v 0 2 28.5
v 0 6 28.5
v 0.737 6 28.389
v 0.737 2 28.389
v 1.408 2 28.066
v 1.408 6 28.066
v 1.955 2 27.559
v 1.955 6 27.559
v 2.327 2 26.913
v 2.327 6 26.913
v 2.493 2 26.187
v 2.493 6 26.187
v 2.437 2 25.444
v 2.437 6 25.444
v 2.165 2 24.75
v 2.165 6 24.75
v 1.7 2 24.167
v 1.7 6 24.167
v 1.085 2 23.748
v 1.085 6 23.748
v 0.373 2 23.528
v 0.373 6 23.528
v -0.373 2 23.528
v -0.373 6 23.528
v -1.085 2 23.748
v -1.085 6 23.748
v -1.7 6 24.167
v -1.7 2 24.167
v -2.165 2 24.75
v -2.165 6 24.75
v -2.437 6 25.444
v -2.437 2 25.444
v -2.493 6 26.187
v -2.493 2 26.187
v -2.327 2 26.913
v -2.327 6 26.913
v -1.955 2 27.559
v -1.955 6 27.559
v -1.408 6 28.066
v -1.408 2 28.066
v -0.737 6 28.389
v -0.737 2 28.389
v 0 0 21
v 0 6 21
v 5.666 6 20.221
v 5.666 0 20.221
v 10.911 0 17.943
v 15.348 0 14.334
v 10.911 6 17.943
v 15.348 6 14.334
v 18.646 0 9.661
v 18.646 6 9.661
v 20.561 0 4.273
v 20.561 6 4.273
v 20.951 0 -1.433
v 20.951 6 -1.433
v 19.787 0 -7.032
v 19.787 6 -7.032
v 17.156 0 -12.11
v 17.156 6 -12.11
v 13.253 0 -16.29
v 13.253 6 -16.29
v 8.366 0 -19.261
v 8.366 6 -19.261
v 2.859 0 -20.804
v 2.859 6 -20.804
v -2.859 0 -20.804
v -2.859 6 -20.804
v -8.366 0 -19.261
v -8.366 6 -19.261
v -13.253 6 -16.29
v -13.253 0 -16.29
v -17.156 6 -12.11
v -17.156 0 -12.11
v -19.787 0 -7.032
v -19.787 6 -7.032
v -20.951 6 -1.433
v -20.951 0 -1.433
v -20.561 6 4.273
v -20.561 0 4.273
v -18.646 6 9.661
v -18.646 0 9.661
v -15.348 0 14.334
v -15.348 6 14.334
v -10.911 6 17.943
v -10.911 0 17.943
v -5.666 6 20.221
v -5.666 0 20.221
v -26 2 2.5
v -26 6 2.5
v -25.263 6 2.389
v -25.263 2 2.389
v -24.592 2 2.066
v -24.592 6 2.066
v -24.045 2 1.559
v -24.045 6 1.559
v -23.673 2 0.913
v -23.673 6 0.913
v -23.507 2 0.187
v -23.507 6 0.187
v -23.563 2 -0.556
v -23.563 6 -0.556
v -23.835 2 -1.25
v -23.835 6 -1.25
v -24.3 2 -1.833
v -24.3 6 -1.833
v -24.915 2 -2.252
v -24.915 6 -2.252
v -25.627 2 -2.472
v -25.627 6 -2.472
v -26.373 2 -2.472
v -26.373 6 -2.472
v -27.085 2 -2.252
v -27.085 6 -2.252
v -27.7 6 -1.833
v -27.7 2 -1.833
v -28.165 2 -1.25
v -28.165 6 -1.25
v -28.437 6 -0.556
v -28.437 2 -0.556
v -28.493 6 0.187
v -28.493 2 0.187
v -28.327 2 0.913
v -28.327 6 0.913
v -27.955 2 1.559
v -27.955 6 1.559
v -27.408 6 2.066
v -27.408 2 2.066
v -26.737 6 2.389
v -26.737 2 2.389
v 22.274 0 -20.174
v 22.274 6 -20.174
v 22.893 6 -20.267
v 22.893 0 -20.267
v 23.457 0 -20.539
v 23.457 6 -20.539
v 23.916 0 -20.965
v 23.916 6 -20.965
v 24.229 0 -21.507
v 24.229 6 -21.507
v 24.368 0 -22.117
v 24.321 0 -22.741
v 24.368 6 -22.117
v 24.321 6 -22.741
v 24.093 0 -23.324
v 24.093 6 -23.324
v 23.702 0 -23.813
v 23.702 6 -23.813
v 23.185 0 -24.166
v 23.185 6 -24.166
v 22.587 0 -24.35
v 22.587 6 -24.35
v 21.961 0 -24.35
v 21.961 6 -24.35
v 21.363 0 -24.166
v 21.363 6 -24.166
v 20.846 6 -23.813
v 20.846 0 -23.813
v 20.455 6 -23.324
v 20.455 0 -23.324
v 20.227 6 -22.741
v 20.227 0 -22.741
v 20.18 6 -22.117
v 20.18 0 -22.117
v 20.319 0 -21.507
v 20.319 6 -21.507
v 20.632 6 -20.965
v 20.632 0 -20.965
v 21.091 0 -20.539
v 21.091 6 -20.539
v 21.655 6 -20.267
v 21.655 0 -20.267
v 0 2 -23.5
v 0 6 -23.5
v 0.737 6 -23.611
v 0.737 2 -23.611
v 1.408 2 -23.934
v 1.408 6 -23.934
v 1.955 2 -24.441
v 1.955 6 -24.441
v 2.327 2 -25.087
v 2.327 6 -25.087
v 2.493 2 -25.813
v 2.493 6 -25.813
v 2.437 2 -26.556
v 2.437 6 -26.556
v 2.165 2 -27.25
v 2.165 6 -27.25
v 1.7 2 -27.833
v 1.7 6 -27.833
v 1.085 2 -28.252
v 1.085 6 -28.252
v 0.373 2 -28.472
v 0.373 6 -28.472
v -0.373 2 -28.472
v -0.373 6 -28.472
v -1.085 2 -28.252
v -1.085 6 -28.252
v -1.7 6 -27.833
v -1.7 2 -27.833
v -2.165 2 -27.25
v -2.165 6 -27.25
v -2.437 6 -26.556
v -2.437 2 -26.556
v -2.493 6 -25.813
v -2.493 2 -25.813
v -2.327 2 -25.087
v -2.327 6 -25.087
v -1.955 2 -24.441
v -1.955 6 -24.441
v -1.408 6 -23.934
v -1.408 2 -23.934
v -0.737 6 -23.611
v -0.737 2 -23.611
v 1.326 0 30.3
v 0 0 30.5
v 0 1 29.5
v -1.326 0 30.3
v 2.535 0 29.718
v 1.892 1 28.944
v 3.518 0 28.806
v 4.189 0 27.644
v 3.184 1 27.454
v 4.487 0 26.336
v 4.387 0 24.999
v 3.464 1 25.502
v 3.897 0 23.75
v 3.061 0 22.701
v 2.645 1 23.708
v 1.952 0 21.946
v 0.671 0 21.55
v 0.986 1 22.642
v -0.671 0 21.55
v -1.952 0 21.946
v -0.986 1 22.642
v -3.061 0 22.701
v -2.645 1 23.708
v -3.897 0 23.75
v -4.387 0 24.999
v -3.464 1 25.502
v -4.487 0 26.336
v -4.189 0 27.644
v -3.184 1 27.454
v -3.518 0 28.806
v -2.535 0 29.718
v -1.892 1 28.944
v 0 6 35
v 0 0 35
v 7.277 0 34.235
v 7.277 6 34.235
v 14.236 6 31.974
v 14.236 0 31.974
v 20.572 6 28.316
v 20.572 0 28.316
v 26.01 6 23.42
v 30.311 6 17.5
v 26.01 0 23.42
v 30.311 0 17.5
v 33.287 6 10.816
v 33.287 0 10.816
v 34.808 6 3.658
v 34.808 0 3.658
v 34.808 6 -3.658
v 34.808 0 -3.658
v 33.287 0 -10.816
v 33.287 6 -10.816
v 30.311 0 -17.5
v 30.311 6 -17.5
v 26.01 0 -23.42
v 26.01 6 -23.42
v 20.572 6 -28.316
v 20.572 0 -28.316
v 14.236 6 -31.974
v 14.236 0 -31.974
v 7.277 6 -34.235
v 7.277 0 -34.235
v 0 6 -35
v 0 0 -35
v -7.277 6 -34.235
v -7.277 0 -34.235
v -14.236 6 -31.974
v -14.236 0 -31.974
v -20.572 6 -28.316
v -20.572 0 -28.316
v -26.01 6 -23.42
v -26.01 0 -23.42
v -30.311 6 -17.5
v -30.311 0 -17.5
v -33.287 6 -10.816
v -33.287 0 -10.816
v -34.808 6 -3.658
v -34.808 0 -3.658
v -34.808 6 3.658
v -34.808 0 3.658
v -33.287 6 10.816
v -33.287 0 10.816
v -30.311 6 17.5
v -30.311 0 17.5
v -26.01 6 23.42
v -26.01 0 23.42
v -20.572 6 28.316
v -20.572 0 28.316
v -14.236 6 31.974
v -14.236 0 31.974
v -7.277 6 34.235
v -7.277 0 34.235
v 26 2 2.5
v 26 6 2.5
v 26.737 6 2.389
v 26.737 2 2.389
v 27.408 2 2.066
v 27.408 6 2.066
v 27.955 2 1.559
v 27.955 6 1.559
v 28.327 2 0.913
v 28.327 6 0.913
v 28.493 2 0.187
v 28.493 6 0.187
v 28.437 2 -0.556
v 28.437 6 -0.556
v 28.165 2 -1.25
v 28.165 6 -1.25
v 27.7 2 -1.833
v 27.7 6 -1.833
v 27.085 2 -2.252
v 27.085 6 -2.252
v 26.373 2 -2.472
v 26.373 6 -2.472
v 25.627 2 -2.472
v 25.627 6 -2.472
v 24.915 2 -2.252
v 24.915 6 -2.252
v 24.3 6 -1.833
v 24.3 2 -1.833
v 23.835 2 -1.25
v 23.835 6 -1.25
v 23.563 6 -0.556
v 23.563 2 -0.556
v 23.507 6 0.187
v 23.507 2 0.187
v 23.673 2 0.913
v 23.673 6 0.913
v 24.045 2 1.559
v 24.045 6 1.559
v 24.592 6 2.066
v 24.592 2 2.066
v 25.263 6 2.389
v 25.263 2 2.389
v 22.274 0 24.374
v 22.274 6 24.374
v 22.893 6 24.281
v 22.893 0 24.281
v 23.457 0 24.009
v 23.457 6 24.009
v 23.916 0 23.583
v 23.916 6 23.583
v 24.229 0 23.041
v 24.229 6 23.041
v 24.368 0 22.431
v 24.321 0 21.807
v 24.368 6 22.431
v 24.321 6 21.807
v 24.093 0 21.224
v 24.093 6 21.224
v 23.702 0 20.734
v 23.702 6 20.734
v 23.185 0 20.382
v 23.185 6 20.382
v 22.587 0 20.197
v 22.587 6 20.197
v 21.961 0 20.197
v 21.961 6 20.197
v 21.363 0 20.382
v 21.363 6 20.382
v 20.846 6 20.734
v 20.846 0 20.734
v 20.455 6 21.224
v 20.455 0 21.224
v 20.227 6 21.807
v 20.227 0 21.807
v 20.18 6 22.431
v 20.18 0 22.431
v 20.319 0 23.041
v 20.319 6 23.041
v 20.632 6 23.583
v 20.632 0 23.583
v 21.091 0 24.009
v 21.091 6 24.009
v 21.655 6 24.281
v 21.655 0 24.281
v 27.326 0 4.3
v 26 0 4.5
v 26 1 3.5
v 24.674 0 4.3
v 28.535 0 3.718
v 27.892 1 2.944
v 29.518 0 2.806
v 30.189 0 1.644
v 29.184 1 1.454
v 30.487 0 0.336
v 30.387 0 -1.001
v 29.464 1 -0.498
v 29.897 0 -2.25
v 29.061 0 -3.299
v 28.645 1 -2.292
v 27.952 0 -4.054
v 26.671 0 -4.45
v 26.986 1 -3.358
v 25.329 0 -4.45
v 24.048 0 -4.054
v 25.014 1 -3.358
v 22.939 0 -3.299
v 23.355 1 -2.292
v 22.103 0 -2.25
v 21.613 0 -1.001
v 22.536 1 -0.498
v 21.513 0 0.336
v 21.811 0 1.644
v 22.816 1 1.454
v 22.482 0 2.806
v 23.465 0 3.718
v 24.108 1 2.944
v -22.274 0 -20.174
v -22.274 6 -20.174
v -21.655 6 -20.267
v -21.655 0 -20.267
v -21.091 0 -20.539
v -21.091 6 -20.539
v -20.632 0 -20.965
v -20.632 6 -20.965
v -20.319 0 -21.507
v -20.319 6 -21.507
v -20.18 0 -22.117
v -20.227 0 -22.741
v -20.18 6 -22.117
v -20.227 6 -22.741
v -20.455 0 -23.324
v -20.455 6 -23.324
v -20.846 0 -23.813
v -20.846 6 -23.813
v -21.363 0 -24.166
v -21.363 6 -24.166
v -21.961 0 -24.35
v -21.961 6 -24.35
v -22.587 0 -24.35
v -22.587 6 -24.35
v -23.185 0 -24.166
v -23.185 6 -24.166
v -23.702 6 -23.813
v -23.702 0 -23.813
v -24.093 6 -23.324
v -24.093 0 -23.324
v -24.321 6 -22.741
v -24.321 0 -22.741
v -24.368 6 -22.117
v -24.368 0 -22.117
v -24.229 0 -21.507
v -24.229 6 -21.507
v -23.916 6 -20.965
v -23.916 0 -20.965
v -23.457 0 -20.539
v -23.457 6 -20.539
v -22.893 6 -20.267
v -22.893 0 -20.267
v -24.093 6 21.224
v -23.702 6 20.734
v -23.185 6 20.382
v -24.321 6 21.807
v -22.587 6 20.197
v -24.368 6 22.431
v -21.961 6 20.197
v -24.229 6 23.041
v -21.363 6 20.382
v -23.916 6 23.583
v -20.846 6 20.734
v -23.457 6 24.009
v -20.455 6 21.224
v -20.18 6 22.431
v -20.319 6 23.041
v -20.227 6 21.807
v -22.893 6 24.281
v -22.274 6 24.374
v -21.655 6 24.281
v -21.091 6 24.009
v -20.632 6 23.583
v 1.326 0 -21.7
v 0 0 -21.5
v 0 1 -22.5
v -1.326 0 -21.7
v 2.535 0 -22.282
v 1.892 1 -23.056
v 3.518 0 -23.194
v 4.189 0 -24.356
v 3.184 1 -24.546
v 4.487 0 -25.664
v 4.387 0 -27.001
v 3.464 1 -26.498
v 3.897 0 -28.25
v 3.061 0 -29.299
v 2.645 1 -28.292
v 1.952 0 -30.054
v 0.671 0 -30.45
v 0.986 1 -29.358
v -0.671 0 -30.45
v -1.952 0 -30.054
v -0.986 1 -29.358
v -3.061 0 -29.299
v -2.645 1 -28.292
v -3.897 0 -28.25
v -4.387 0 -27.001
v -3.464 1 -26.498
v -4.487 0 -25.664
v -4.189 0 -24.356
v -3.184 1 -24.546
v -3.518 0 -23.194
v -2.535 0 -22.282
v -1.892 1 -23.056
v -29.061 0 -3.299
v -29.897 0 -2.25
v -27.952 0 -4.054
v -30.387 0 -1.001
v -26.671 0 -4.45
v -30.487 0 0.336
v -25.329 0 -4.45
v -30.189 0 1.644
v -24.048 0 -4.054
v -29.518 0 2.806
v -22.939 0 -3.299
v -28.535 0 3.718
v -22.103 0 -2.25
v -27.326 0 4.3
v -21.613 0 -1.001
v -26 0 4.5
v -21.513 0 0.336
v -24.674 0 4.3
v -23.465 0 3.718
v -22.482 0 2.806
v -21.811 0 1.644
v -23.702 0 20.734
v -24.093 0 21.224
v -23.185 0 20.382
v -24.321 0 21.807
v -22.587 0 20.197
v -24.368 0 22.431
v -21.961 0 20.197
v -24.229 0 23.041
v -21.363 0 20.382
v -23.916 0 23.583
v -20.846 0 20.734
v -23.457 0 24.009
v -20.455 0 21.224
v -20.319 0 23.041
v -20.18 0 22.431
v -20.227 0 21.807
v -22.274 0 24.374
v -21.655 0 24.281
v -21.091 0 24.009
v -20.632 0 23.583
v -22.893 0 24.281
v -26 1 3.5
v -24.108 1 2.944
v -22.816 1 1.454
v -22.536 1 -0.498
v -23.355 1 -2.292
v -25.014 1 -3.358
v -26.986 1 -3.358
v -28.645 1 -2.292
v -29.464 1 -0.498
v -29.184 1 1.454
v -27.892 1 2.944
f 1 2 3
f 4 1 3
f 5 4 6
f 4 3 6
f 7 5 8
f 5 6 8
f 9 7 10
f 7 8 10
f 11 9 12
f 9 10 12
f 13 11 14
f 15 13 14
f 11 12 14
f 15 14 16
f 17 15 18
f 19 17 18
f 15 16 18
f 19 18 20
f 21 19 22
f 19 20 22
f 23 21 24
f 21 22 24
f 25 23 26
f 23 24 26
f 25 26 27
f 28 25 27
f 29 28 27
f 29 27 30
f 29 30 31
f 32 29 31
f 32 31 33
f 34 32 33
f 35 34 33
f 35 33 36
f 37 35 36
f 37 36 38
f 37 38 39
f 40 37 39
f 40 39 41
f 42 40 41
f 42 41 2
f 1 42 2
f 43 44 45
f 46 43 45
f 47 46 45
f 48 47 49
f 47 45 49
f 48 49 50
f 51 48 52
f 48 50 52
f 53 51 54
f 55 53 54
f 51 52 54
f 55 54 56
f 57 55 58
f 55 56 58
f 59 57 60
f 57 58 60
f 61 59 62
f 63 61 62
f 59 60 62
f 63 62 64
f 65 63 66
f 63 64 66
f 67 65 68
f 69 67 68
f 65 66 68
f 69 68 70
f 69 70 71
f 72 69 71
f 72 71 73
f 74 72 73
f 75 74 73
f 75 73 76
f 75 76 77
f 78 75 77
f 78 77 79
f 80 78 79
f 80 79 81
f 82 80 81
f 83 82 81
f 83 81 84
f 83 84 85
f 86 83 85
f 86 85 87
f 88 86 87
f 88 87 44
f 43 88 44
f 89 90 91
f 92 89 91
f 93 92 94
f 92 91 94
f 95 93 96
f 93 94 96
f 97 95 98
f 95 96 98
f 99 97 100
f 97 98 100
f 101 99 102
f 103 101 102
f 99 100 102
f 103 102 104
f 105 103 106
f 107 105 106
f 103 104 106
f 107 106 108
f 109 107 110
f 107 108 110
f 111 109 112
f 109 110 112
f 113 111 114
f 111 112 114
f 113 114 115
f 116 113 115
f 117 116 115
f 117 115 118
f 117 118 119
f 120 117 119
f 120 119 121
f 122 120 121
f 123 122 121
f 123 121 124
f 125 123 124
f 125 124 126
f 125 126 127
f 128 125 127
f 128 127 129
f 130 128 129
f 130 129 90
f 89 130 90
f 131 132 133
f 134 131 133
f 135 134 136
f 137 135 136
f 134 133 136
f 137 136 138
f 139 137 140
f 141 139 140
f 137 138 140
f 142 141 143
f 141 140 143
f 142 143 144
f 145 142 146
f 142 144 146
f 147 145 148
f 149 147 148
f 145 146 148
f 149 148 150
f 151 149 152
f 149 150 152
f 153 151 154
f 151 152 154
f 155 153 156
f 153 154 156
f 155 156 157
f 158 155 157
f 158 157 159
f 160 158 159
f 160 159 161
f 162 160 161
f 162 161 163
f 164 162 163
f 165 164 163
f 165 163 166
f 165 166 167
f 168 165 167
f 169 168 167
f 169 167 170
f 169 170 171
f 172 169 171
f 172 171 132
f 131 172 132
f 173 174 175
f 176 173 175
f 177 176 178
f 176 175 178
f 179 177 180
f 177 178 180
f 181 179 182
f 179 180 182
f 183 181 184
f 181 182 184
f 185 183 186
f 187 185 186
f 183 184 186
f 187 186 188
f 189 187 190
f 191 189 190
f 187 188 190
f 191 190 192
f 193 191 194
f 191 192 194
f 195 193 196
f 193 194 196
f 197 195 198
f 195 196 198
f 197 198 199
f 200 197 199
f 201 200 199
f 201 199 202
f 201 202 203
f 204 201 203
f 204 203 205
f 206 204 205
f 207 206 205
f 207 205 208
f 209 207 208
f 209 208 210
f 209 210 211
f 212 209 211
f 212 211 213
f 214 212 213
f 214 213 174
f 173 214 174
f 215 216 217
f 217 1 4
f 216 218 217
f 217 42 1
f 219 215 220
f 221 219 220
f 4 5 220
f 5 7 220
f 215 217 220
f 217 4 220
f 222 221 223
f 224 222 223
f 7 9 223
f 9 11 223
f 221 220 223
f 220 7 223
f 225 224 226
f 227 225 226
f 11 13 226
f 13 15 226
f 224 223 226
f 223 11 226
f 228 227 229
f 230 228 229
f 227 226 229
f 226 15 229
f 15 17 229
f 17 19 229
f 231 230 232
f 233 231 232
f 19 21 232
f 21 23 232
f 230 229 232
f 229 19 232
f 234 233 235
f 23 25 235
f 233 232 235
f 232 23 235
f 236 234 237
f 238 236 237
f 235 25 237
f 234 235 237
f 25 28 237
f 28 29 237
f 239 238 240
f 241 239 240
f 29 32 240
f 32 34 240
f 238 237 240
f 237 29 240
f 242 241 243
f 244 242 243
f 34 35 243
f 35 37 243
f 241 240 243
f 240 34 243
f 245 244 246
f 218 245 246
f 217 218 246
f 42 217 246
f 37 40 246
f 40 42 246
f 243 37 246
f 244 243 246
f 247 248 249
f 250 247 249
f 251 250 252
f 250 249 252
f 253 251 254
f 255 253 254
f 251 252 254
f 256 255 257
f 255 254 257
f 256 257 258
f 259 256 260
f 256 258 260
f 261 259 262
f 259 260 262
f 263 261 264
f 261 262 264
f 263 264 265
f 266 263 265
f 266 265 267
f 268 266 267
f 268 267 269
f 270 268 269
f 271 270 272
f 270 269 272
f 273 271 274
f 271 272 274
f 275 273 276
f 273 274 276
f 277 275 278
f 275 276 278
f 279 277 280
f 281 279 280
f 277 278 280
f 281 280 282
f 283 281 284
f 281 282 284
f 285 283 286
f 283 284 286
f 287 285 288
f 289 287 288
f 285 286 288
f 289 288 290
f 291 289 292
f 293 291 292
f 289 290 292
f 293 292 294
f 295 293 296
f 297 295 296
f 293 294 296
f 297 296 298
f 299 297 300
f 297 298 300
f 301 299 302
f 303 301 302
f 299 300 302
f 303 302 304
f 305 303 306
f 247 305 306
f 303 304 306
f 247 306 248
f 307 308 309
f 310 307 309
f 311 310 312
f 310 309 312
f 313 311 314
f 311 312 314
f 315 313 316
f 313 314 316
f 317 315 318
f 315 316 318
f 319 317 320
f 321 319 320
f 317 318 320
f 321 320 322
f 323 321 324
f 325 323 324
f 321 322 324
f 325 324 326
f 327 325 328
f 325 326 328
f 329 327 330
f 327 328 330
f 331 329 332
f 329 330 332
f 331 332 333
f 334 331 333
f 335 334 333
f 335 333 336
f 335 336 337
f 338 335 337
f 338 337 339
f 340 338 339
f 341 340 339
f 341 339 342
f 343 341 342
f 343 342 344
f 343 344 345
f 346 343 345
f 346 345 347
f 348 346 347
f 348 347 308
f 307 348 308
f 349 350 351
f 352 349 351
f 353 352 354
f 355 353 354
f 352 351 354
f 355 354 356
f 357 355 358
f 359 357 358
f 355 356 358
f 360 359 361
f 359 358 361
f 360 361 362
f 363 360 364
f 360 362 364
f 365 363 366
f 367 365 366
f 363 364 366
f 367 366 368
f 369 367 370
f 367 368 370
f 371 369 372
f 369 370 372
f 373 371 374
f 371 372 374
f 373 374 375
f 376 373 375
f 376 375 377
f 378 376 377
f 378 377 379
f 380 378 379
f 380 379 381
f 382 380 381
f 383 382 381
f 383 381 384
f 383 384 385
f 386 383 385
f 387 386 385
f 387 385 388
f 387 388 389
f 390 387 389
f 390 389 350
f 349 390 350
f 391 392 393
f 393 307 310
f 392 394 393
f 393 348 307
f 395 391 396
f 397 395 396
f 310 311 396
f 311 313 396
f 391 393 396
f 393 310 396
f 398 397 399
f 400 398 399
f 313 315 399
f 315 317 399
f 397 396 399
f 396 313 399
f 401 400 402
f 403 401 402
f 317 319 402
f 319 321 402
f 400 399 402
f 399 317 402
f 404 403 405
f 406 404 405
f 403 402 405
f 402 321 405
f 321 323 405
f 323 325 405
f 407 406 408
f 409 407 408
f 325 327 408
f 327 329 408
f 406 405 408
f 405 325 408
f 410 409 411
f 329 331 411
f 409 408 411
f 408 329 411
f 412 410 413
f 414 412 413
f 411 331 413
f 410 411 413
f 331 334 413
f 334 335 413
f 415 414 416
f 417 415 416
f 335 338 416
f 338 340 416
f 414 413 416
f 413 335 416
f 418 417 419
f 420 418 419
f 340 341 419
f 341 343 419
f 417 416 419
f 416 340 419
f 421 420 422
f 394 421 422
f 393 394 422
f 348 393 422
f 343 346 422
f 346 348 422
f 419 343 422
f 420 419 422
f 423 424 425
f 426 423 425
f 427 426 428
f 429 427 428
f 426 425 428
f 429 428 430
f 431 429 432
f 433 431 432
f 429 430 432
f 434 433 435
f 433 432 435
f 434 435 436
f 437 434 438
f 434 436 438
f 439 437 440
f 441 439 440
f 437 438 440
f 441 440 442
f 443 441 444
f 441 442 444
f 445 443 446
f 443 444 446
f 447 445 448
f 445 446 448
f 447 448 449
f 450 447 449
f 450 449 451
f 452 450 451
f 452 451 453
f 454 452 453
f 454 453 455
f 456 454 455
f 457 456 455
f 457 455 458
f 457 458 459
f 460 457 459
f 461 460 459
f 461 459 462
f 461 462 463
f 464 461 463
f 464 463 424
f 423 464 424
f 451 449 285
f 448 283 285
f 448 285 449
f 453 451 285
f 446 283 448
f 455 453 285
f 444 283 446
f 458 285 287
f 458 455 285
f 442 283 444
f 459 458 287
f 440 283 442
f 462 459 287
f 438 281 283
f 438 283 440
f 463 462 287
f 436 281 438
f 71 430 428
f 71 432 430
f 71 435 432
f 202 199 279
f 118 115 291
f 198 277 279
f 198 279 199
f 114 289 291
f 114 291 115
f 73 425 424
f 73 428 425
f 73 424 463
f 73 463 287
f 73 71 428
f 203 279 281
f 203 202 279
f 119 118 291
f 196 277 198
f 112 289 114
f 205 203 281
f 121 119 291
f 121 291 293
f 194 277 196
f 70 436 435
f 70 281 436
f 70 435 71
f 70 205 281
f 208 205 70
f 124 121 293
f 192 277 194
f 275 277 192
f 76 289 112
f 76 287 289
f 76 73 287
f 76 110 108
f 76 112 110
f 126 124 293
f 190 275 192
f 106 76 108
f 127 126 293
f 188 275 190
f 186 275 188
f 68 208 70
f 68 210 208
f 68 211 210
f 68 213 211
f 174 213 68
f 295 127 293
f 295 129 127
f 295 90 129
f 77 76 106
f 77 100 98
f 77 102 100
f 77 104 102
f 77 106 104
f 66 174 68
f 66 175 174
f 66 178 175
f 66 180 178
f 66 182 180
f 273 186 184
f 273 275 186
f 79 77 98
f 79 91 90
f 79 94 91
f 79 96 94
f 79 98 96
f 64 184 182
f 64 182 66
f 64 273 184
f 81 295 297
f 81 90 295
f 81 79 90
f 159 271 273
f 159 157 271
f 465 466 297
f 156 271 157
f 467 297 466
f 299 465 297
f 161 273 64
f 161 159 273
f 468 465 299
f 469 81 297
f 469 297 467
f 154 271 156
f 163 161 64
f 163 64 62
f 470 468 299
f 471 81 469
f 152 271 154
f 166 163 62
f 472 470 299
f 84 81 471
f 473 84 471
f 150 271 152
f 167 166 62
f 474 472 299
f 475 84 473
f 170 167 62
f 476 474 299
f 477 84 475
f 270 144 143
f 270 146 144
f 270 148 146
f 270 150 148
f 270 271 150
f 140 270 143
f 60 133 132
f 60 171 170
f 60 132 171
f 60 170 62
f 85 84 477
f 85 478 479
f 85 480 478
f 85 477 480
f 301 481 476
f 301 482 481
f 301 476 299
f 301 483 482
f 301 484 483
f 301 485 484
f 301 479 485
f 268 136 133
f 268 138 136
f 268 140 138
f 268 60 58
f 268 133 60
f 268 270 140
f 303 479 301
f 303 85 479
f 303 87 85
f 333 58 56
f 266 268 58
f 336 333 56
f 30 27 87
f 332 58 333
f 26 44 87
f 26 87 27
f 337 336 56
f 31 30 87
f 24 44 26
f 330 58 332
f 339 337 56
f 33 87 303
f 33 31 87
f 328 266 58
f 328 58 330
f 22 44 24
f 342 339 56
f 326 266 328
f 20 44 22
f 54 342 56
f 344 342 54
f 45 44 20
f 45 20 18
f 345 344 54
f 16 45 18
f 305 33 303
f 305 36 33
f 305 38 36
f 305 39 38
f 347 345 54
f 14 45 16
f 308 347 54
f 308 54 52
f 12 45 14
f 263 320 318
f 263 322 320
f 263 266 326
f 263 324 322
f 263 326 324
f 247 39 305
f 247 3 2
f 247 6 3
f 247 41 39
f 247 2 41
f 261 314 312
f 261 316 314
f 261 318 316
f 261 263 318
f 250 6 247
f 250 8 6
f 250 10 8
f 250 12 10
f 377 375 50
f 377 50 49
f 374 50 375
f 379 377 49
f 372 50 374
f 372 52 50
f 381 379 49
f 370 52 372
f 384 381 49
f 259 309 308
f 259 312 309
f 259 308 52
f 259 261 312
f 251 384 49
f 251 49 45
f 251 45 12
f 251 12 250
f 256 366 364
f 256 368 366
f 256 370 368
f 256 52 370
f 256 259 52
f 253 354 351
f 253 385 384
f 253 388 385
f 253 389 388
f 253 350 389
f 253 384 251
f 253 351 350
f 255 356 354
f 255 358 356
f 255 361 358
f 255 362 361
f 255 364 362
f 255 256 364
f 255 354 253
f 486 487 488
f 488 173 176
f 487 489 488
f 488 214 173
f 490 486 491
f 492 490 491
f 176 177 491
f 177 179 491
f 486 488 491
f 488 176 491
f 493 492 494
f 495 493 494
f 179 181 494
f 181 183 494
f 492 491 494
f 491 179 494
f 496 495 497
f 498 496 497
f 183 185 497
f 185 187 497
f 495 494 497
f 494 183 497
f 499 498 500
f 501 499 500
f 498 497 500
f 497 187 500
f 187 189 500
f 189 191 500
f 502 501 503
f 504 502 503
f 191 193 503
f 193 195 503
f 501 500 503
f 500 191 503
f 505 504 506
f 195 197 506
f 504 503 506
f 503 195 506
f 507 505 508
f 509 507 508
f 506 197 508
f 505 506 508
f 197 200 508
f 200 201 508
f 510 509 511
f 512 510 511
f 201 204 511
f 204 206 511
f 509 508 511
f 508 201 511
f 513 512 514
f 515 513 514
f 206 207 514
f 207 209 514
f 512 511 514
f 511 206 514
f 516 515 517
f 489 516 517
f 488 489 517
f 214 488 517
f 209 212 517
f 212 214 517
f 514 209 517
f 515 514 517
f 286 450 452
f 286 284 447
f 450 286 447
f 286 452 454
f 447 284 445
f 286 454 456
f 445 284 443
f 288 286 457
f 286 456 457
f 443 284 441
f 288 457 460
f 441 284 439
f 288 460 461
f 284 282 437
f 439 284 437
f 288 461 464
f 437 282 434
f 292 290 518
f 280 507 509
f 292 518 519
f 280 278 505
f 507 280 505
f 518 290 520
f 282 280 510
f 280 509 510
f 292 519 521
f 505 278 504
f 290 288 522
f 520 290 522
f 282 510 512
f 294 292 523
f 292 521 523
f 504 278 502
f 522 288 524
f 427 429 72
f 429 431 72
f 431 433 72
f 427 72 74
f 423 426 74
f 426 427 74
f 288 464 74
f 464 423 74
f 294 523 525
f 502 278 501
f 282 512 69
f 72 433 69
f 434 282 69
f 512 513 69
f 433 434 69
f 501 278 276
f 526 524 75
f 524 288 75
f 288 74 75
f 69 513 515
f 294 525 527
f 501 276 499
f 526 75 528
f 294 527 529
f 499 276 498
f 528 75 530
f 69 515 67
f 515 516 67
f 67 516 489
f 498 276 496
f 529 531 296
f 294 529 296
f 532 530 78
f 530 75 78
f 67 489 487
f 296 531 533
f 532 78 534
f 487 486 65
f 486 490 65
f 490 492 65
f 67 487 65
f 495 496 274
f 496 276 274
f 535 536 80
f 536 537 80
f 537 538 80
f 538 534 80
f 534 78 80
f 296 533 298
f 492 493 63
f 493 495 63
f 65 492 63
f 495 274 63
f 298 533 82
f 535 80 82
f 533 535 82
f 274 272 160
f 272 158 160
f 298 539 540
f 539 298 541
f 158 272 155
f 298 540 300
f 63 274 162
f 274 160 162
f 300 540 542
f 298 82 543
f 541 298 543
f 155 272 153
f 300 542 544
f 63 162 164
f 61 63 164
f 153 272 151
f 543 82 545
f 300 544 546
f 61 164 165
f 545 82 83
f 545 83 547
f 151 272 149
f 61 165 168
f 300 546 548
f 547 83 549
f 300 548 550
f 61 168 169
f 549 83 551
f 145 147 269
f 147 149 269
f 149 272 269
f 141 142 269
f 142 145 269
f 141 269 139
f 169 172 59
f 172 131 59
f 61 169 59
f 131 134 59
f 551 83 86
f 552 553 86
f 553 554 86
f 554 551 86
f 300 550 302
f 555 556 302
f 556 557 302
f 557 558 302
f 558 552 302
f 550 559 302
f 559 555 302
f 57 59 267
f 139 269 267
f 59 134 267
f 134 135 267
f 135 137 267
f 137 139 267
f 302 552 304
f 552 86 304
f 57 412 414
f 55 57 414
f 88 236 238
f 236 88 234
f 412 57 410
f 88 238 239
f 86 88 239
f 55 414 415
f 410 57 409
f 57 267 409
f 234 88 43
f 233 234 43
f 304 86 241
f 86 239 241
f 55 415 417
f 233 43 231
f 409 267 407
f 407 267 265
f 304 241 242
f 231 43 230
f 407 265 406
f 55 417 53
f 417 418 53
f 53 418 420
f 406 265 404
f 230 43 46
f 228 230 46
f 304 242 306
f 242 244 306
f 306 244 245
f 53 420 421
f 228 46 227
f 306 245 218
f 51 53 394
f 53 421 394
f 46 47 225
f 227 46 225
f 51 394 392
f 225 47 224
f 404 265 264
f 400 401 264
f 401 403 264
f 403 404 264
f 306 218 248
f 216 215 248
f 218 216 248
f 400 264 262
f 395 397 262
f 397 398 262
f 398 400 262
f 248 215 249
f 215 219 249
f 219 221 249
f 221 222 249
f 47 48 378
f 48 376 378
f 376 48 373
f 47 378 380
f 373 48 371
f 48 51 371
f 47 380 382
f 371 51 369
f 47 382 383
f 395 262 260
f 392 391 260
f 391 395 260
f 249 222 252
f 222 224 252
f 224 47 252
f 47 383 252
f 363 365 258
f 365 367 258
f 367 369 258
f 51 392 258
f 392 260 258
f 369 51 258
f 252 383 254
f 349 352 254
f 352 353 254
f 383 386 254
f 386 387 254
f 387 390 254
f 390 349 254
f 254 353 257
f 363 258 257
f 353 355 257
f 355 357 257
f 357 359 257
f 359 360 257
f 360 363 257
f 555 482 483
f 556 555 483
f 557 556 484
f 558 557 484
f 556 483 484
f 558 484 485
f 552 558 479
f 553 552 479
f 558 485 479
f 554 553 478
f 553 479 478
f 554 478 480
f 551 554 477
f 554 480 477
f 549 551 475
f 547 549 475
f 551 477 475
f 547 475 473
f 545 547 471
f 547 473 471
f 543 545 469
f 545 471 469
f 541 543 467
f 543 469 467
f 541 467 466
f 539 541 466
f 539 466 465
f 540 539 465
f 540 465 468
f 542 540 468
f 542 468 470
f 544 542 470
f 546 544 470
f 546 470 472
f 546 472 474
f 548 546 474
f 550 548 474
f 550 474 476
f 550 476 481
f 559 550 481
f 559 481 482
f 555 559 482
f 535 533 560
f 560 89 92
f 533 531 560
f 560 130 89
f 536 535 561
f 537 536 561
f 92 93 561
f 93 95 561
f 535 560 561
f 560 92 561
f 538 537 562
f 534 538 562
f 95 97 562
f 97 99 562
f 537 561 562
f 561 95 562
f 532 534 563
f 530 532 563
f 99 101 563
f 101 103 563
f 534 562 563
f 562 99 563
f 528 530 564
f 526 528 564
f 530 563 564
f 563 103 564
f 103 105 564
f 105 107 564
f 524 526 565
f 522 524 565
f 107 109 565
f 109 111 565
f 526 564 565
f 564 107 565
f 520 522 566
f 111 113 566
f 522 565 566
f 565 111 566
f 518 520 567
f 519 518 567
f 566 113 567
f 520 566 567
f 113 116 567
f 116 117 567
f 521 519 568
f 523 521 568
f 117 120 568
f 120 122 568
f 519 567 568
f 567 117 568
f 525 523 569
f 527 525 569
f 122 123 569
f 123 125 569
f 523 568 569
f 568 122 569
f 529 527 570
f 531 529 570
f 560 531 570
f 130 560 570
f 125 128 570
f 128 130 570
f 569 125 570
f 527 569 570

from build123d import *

# Parameters (mm, degrees)
SKETCH_1_R          = 35
EXTRUDE_1_DEPTH     = 6
SKETCH_2_R          = 21
SKETCH_2_R_2        = 2.5
SKETCH_2_R_3        = 2.1
CUT_EXTRUDE_1_DEPTH = 10
CHAMFER_1_SIZE      = 2


with BuildPart() as part:
    # Эскиз1 → Бобышка-Вытянуть1 (new body)
    with BuildSketch(Plane(origin=(0, 0, 0), x_dir=(1, 0, 0), z_dir=(0, 1, 0))):
        with Locations(Location((0, 0, 0), (0, 0, 270))):
            Circle(SKETCH_1_R)
    extrude(amount=EXTRUDE_1_DEPTH)

    # Эскиз2 → Вырез-Вытянуть1 (cut)
    with BuildSketch(Plane(origin=(0, 6, 0), x_dir=(1, 0, 0), z_dir=(0, 1, 0))):
        with Locations(Location((0, 0, 0), (0, 0, 270))):
            Circle(SKETCH_2_R)
        with Locations(Location((0, 26, 0), (0, 0, 270))):
            Circle(SKETCH_2_R_2)
        with Locations(Location((0, -26, 0), (0, 0, 270))):
            Circle(SKETCH_2_R_2)
        with Locations(Location((26, 0, 0), (0, 0, 270))):
            Circle(SKETCH_2_R_2)
        with Locations(Location((-26, 0, 0), (0, 0, 270))):
            Circle(SKETCH_2_R_2)
        with Locations(Location((-22.273863607, 22.273863607, 0), (0, 0, 270))):
            Circle(SKETCH_2_R_3)
        with Locations(Location((-22.273863607, -22.273863607, 0), (0, 0, 270))):
            Circle(SKETCH_2_R_3)
        with Locations(Location((22.273863607, -22.273863607, 0), (0, 0, 270))):
            Circle(SKETCH_2_R_3)
        with Locations(Location((22.273863607, 22.273863607, 0), (0, 0, 270))):
            Circle(SKETCH_2_R_3)
    extrude(amount=-CUT_EXTRUDE_1_DEPTH, mode=Mode.SUBTRACT)

    # Фаска1
    chamfer_1_edges = [part.edges().sort_by_distance(p)[0] for p in [
        (0, 0, -28.5),
        (0, 0, 23.5),
        (26, 0, -2.5),
        (-26, 0, -2.5),
    ]]
    chamfer(chamfer_1_edges, length=CHAMFER_1_SIZE)


solid = part.part
